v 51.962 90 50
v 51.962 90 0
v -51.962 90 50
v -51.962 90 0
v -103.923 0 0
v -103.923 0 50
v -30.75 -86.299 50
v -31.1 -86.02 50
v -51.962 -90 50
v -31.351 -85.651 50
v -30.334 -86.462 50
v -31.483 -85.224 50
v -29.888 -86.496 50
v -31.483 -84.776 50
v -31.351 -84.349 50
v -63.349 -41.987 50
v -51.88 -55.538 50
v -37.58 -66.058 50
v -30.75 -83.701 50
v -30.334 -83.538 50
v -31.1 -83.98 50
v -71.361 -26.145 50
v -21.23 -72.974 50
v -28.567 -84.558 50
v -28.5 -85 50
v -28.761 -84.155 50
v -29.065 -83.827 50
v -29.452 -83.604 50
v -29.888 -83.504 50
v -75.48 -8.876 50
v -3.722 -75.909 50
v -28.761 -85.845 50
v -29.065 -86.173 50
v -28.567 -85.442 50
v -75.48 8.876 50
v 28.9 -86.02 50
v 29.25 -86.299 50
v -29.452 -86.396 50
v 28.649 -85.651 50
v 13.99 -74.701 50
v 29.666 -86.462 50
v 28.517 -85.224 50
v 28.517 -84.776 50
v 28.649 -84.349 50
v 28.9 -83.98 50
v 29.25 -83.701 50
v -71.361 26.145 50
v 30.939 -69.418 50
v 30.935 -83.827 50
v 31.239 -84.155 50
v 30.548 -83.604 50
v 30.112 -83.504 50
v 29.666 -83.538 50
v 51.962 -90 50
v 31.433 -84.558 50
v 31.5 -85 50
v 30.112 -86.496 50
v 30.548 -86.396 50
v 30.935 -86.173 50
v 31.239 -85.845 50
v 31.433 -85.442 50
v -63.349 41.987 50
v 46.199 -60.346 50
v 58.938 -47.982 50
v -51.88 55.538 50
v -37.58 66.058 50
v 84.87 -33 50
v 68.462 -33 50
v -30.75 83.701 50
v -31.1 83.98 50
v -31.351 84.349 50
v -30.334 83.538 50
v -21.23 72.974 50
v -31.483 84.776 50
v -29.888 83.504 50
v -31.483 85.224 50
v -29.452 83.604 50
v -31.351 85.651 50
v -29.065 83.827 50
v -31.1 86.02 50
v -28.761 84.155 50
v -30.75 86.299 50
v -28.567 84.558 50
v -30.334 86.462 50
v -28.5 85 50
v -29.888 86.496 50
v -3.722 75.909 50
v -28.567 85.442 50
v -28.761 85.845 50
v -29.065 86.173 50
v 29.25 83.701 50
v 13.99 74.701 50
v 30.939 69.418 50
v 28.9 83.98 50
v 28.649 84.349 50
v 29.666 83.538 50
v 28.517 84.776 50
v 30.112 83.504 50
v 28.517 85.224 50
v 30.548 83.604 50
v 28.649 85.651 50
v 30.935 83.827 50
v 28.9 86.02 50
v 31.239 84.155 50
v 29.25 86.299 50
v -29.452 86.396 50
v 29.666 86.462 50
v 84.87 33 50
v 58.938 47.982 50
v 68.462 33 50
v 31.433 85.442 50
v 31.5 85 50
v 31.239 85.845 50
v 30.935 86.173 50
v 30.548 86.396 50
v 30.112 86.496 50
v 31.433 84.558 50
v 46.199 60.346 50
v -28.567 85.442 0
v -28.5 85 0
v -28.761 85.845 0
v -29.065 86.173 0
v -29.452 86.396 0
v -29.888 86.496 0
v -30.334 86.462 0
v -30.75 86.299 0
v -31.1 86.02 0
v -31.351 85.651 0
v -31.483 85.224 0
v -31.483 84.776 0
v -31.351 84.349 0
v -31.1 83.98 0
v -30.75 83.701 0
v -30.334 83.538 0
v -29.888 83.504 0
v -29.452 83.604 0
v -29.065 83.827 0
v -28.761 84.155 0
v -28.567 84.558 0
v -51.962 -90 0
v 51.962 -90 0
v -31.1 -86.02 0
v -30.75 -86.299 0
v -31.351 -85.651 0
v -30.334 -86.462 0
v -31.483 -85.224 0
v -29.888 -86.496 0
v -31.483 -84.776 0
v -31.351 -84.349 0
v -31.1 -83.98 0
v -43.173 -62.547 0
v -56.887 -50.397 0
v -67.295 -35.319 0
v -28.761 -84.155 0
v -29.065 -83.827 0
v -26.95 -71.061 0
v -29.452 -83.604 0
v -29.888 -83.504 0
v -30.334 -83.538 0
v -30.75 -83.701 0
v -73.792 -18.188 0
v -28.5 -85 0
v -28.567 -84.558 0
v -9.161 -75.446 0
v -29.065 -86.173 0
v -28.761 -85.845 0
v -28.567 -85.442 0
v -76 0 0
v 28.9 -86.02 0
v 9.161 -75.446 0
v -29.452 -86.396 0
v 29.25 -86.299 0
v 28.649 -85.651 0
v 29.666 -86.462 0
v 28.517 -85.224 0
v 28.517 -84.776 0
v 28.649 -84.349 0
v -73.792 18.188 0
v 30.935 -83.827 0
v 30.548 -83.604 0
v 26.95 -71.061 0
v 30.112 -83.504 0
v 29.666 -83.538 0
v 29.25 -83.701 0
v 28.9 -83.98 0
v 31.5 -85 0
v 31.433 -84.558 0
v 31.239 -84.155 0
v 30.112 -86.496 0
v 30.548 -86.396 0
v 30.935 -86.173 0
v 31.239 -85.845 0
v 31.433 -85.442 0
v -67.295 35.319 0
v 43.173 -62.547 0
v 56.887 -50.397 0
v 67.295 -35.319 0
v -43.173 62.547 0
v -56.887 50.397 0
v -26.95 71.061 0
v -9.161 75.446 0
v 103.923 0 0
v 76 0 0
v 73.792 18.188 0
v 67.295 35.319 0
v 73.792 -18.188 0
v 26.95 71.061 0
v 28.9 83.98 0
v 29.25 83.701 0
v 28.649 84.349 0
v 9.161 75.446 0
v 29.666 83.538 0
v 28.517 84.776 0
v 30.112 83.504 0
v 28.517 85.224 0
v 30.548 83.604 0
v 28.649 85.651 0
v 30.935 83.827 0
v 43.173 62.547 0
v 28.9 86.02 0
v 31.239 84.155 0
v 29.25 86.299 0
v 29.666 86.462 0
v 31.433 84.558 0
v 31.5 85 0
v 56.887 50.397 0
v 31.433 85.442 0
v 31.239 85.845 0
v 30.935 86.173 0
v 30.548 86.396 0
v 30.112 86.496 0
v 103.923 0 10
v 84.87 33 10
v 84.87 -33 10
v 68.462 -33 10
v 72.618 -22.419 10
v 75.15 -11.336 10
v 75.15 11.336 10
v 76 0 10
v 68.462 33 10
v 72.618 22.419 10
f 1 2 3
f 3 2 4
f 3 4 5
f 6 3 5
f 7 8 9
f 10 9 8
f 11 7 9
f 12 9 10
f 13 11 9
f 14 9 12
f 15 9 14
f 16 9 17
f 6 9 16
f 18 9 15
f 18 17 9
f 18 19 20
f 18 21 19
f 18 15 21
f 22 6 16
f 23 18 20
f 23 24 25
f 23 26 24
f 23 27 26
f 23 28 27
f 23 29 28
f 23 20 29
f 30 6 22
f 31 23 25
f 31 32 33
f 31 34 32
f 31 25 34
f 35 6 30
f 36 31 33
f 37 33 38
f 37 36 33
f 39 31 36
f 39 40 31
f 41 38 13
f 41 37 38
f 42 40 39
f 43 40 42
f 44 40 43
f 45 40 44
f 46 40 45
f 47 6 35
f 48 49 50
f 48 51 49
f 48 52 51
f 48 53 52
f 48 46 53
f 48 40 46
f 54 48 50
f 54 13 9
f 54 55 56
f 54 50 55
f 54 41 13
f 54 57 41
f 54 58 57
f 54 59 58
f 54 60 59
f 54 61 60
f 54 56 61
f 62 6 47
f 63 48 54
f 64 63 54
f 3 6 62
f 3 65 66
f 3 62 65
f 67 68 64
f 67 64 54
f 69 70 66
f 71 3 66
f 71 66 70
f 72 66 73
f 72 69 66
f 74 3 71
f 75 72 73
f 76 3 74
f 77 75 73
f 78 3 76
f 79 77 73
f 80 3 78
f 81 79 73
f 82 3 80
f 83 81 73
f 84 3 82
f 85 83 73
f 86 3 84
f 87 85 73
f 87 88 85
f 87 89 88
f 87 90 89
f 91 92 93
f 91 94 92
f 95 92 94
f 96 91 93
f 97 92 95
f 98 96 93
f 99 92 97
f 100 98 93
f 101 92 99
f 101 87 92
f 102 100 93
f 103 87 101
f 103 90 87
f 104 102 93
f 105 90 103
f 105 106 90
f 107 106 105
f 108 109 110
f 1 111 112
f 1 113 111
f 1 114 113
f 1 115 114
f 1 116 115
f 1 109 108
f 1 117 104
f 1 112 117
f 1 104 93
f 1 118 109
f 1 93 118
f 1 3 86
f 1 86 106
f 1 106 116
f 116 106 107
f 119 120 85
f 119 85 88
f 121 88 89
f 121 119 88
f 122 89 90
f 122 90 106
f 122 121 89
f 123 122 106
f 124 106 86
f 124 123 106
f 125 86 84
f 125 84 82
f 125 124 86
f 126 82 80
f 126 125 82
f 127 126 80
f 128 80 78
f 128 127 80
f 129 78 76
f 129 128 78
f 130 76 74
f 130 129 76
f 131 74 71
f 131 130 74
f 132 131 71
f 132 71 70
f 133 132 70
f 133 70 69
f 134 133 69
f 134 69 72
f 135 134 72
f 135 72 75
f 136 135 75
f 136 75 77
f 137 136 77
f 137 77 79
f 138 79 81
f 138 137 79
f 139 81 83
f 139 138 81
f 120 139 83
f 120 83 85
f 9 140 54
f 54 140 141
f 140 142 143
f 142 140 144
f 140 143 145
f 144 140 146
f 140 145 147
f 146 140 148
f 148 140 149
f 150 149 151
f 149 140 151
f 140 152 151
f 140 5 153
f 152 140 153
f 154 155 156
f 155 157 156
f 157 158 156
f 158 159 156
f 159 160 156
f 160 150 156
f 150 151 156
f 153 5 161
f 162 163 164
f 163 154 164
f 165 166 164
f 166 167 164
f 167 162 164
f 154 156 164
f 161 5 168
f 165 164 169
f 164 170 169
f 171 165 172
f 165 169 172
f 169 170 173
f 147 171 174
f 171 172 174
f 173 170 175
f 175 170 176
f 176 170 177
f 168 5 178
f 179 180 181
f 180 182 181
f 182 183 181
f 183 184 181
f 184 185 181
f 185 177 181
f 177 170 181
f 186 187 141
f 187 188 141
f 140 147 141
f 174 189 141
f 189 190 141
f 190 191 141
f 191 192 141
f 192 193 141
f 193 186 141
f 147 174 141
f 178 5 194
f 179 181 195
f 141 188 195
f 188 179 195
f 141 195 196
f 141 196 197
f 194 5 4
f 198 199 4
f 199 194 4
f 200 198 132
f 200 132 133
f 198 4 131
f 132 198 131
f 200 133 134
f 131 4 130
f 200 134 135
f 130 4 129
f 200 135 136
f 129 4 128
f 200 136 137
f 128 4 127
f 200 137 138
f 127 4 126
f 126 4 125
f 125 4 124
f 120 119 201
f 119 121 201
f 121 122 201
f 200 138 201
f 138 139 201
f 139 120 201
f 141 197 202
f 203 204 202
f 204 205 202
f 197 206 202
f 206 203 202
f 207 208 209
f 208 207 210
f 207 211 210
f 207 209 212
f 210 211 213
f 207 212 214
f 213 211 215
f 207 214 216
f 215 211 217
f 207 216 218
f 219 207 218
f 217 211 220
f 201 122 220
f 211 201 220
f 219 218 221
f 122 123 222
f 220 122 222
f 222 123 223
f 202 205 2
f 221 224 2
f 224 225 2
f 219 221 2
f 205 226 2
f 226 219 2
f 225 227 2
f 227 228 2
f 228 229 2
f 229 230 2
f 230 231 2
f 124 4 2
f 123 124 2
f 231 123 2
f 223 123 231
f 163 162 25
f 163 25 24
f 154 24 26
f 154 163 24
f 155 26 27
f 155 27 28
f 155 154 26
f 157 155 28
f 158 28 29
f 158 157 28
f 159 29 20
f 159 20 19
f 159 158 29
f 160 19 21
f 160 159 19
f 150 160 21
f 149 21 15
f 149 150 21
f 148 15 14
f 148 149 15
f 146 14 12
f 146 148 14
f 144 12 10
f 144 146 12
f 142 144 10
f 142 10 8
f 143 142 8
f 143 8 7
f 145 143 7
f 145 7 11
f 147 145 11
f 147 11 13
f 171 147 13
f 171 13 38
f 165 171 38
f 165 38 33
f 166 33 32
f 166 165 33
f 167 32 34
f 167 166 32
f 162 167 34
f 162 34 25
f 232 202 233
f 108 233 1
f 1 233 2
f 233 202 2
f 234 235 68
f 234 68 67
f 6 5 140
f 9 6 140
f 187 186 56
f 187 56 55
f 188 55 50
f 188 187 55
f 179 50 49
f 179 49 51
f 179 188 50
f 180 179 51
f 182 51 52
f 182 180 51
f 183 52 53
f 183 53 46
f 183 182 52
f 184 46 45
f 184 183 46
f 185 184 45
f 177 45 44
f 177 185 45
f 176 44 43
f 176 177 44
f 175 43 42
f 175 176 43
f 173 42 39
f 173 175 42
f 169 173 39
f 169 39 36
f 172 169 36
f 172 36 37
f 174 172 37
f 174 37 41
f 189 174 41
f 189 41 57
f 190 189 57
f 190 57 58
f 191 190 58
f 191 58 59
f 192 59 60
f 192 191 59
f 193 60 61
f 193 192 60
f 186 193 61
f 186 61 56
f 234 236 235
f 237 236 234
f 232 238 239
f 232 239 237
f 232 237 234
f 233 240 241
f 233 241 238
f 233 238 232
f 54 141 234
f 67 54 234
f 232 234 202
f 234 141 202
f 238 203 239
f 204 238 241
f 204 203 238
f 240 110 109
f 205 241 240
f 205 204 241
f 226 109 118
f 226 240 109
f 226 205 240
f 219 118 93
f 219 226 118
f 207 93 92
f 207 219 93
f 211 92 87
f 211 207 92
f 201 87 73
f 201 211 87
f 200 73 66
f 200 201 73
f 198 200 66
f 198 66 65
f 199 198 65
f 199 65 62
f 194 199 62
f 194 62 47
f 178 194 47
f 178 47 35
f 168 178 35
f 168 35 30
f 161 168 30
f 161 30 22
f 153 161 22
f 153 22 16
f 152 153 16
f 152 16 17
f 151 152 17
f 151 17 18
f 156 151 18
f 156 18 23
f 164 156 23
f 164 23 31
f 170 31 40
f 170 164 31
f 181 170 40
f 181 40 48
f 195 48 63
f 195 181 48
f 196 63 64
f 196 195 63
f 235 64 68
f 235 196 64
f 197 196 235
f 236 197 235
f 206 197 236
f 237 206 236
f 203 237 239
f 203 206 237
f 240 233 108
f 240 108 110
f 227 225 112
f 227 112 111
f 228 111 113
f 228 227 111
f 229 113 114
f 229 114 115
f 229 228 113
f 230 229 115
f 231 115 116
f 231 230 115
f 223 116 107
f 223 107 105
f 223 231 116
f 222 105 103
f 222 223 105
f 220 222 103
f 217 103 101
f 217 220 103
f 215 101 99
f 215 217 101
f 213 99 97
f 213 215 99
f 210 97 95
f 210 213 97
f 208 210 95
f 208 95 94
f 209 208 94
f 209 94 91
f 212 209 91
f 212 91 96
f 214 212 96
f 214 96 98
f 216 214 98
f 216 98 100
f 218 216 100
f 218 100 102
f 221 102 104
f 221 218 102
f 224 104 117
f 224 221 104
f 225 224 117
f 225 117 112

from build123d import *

# Parameters (mm, degrees)
SKETCH1_R           = 76
SKETCH1_R_2         = 1.5
BOSS_EXTRUDE1_DEPTH = 50
CUT_EXTRUDE1_START  = -40
CUT_EXTRUDE1_DEPTH  = 40


with BuildPart() as part:
    # Sketch1 → Boss-Extrude1 (new body)
    with BuildSketch(Plane.XY):
        Polygon((103.923048454, 0), (51.961524227, 90), (-51.961524227, 90), (-103.923048454, 0), (-51.961524227, -90), (51.961524227, -90), align=None)
        Circle(SKETCH1_R, mode=Mode.SUBTRACT)
        with Locations((30, -85)):
            Circle(SKETCH1_R_2, mode=Mode.SUBTRACT)
        with Locations((-30, -85)):
            Circle(SKETCH1_R_2, mode=Mode.SUBTRACT)
        with Locations((30, 85)):
            Circle(SKETCH1_R_2, mode=Mode.SUBTRACT)
        with Locations((-30, 85)):
            Circle(SKETCH1_R_2, mode=Mode.SUBTRACT)
    extrude(amount=BOSS_EXTRUDE1_DEPTH)

    # Sketch4 → Cut-Extrude1 (cut)
    with BuildSketch(Plane.XY.offset(50).offset(CUT_EXTRUDE1_START)):
        with BuildLine():
            ThreePointArc((68.461668107, 33), (74.091452868, 16.925029156), (76, 0))
            Line((76, 0), (103.923048454, 0))
            Line((103.923048454, 0), (84.870489571, 33))
            Line((84.870489571, 33), (68.461668107, 33))
        make_face()
        with BuildLine():
            Line((103.923048454, 0), (76, 0))
            ThreePointArc((76, 0), (74.091452868, -16.925029156), (68.461668107, -33))
            Line((68.461668107, -33), (84.870489571, -33))
            Line((84.870489571, -33), (103.923048454, 0))
        make_face()
    extrude(amount=CUT_EXTRUDE1_DEPTH, mode=Mode.SUBTRACT)


solid = part.part
